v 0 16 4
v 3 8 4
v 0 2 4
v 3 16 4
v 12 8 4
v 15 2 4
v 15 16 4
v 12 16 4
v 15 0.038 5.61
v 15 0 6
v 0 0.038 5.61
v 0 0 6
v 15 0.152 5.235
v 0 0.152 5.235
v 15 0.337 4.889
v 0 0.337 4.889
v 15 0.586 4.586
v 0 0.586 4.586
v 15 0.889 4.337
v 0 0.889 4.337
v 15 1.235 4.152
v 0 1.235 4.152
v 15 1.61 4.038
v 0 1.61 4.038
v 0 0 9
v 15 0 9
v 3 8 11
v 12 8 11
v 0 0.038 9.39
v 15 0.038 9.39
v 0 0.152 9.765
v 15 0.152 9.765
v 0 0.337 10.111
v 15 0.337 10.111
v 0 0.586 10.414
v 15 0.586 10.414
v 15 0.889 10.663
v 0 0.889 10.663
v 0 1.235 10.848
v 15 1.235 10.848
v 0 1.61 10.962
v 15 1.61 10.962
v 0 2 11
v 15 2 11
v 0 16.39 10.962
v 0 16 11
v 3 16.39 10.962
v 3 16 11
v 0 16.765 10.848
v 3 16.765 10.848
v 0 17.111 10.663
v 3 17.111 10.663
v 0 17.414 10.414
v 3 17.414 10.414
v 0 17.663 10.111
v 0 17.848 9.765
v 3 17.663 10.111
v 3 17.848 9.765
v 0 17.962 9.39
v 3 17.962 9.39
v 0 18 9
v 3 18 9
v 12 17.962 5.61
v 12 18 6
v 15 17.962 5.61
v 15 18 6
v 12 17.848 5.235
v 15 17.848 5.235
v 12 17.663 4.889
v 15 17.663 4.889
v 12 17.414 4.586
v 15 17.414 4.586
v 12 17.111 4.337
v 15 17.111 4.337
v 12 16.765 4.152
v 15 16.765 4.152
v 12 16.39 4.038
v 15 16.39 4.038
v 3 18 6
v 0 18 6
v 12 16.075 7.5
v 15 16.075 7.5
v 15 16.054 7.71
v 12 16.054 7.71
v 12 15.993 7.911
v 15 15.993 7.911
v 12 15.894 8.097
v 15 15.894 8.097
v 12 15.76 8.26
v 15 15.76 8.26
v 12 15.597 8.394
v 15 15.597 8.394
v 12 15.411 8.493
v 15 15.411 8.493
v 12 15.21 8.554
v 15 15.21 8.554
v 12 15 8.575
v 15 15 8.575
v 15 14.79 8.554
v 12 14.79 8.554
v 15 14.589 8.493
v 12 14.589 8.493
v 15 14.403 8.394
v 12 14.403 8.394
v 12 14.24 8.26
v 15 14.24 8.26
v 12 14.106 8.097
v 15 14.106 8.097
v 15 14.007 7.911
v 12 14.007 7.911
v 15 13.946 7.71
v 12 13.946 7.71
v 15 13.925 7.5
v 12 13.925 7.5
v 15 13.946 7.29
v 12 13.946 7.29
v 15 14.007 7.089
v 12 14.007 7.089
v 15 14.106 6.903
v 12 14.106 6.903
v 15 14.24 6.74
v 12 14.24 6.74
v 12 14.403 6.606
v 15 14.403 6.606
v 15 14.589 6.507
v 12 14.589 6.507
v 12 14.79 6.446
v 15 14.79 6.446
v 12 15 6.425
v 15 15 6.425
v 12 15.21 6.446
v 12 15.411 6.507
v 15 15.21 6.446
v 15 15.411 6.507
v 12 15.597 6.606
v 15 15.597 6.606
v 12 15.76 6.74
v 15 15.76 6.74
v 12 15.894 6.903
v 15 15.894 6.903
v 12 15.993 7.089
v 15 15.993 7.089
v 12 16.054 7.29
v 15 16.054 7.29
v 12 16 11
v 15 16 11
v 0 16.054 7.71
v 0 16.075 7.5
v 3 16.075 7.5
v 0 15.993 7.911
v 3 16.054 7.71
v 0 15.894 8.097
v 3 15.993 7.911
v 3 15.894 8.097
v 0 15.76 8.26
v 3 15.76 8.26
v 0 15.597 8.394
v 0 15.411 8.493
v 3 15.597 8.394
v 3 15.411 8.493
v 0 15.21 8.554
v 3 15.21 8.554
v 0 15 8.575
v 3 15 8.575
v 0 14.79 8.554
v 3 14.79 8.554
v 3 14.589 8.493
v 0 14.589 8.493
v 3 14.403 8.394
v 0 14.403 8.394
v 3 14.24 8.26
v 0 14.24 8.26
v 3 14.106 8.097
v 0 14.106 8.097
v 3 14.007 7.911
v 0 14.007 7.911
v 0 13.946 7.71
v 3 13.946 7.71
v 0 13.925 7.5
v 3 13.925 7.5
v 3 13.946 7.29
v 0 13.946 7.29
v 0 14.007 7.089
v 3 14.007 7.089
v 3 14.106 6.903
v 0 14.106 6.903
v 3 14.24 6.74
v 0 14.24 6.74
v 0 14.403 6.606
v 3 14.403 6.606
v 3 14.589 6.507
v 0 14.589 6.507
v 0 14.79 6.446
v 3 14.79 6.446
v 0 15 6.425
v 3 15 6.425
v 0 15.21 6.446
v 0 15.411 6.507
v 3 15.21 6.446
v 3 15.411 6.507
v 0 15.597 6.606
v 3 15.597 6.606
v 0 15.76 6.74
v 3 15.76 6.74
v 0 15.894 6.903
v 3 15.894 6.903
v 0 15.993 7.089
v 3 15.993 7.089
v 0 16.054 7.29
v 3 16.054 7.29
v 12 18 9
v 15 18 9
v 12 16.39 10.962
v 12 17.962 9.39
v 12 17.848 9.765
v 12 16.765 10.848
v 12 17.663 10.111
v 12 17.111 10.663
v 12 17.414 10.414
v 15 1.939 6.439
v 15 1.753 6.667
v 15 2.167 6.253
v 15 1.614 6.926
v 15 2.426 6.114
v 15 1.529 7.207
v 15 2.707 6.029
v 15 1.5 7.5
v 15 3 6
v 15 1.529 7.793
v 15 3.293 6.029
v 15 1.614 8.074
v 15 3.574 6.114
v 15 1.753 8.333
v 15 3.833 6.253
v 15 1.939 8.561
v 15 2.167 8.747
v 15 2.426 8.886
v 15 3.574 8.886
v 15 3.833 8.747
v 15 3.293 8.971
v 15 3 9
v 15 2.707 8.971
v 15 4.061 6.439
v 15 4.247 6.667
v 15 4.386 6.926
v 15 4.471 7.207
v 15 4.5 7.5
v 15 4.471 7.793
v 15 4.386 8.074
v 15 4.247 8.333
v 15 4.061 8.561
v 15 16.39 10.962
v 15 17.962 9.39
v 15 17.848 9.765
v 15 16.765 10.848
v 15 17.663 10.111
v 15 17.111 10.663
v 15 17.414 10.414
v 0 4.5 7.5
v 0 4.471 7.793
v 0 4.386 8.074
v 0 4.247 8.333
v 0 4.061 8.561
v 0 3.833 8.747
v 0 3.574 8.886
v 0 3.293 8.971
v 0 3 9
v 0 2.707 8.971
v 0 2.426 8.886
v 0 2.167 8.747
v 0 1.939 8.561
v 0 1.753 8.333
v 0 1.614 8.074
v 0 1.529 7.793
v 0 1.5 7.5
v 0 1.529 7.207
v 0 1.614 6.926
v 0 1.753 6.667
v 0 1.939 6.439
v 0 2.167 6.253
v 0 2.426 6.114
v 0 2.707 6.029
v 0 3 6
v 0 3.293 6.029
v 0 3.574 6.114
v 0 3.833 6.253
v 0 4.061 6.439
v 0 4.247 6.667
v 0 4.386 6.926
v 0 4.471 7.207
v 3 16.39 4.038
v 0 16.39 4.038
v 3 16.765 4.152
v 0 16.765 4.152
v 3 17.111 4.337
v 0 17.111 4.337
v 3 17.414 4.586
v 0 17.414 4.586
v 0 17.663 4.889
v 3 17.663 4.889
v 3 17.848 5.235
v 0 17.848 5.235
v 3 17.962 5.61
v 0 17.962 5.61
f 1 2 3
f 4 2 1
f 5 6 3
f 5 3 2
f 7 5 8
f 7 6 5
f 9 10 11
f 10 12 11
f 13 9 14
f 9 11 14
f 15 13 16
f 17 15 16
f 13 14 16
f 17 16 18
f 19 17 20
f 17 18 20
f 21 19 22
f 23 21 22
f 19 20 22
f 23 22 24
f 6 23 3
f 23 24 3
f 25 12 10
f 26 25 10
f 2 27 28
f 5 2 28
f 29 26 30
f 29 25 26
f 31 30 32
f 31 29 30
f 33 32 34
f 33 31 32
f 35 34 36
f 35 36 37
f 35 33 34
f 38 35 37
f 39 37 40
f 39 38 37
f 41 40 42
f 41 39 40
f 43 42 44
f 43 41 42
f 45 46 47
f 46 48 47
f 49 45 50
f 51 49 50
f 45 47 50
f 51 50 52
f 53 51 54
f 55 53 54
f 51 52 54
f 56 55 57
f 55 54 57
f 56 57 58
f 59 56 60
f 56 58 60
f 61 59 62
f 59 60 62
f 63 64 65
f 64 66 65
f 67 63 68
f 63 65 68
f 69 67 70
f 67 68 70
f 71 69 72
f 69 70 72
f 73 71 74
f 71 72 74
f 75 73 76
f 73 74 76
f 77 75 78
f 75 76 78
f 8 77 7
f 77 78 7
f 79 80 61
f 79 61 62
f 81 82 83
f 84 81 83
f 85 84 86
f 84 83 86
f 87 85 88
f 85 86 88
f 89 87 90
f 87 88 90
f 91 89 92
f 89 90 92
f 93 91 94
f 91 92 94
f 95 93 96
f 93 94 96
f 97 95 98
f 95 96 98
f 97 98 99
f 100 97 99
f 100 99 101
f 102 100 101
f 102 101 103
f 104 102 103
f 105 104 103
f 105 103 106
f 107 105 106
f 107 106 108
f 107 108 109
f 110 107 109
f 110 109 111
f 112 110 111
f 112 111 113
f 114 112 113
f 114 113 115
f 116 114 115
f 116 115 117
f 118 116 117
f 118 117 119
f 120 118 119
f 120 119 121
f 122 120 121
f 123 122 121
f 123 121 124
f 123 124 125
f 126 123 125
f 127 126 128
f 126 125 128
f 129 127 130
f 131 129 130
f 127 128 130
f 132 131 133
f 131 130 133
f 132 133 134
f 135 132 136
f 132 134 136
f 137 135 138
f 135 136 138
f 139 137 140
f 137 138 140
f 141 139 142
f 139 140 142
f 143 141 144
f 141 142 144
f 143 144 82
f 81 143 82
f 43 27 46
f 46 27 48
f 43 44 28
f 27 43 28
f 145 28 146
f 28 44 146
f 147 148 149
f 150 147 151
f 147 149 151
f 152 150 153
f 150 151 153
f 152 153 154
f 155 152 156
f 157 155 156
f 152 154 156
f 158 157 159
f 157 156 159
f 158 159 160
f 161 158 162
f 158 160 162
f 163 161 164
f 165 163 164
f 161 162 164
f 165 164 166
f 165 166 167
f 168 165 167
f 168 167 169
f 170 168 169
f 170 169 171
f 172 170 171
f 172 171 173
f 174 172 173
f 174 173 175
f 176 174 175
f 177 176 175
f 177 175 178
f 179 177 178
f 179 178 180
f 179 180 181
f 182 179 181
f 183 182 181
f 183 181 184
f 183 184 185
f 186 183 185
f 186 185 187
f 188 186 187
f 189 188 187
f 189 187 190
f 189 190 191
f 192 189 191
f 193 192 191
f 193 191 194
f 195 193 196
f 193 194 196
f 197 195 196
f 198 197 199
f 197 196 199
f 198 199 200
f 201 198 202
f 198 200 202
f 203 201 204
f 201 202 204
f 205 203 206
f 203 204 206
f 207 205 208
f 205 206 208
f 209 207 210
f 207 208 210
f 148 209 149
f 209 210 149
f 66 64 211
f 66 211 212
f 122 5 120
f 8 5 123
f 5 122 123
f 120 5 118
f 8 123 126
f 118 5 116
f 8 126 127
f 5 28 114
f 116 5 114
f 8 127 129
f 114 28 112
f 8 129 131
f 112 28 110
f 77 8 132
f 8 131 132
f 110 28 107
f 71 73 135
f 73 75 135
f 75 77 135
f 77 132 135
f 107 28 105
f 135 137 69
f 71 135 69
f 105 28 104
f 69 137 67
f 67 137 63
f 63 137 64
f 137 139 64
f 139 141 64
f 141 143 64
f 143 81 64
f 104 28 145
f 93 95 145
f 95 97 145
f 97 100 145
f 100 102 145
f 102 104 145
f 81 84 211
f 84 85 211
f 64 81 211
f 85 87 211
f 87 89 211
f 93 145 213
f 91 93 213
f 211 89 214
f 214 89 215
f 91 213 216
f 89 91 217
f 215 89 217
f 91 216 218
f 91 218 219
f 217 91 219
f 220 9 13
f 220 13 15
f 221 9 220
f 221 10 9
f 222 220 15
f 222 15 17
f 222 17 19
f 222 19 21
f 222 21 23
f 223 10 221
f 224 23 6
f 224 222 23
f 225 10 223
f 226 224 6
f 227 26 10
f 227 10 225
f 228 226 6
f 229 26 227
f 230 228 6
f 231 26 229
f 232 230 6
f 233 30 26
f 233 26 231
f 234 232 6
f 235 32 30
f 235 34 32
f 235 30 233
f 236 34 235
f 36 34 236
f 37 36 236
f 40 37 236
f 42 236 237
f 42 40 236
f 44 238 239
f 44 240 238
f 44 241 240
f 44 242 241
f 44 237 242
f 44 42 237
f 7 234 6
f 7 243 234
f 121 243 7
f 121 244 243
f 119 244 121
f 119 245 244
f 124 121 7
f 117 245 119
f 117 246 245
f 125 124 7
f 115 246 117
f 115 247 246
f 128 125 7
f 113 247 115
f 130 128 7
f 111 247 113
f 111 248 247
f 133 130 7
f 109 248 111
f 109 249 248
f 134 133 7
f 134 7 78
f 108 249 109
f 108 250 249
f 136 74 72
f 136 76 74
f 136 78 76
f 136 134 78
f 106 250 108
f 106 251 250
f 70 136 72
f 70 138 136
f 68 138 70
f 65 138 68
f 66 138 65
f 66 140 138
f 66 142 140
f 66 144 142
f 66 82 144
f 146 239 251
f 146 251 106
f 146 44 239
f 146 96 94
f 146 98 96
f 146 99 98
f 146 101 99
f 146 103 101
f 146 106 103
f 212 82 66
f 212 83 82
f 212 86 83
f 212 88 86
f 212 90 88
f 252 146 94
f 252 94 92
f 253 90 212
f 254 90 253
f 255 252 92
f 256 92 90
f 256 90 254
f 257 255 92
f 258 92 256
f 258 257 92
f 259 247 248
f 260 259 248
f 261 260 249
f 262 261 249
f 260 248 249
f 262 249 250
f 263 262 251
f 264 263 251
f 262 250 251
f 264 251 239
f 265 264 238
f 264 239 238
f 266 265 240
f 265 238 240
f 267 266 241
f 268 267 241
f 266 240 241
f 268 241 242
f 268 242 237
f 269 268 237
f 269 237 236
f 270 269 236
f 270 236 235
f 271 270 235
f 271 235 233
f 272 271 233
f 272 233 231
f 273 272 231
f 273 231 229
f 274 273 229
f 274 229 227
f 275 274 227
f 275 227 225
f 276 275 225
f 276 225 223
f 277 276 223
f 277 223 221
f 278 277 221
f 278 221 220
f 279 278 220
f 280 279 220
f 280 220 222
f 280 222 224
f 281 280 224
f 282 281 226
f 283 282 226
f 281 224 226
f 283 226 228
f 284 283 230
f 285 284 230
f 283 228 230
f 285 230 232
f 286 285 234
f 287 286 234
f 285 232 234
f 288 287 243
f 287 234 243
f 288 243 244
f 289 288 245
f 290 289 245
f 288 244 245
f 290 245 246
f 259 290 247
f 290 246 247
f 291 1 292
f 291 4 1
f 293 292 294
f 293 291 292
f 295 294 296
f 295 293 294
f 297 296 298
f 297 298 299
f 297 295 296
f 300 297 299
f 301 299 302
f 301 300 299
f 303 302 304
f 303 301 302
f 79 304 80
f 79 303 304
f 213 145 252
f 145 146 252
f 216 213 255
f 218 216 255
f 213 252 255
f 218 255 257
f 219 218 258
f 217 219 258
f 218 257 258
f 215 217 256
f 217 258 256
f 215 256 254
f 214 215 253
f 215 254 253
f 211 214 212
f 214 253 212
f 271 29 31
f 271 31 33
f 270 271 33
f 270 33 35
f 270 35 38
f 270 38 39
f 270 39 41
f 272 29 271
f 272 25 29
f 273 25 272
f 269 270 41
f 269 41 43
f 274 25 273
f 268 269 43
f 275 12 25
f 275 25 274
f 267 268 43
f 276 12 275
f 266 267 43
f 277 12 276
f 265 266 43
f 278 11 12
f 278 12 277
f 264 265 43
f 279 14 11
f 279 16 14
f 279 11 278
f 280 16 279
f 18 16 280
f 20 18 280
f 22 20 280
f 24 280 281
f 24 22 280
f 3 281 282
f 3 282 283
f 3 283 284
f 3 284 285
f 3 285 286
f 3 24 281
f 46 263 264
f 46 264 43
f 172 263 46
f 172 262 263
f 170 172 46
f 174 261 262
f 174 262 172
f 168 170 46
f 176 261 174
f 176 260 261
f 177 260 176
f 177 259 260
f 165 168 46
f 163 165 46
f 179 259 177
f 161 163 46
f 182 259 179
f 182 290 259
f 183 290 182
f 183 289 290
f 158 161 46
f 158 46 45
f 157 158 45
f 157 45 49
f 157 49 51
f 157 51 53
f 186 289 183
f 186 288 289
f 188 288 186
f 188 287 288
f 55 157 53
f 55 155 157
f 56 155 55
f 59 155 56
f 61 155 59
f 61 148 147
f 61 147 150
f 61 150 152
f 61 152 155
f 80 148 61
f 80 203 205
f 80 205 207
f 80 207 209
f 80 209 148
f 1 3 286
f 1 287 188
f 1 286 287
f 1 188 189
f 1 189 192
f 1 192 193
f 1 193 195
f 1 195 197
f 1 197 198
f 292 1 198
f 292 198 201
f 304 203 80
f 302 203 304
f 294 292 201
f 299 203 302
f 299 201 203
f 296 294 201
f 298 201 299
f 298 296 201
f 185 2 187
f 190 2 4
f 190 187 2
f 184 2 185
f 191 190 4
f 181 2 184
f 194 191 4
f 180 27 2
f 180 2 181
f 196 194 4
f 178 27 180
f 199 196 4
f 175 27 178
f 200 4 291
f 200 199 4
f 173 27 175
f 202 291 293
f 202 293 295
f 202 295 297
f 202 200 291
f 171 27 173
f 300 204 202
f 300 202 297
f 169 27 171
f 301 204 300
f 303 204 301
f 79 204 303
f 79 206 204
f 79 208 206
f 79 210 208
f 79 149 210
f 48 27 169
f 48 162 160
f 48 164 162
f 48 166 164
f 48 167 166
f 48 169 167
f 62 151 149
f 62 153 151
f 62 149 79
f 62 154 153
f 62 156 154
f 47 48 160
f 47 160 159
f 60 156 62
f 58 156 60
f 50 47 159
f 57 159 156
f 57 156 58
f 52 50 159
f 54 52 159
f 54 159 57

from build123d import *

# Parameters (mm, degrees)
SKETCH_1_W          = 20
SKETCH_1_H          = 18
EXTRUDE_1_DEPTH     = 15
SKETCH_2_R          = 1.5
CUT_EXTRUDE_1_DEPTH = 31.805843601
SKETCH_3_W          = 10
SKETCH_3_H          = 10
CUT_EXTRUDE_2_DEPTH = 15
SKETCH_5_W          = 4
SKETCH_5_H          = 18
CUT_EXTRUDE_3_DEPTH = 31.805843601
SKETCH_6_R          = 1
CUT_EXTRUDE_4_DEPTH = 30.068883707
SKETCH_8_W          = 11.4
SKETCH_8_H          = 10
CUT_EXTRUDE_5_DEPTH = 10
SKETCH_9_W          = 11.4
SKETCH_9_H          = 10
EXTRUDE_2_DEPTH     = 7
SKETCH_10_R         = 1.075
CUT_EXTRUDE_6_DEPTH = 20
SKETCH_11_W         = 5
SKETCH_11_H         = 18
CUT_EXTRUDE_7_DEPTH = 20
SKETCH_12_W         = 9
SKETCH_12_H         = 10
CUT_EXTRUDE_8_DEPTH = 20
FILLET_1_R          = 2
FILLET_2_R          = 2
FILLET_3_R          = 2
FILLET_4_R          = 2
FILLET_5_R          = 2
FILLET_6_R          = 2


with BuildPart() as part:
    # 草图1 → 凸台-拉伸1 (new body)
    with BuildSketch(Plane.XY):
        with Locations((10, 9)):
            Rectangle(SKETCH_1_W, SKETCH_1_H)
    extrude(amount=EXTRUDE_1_DEPTH)

    # 草图2 → 切除-拉伸1 (cut, through all)
    with BuildSketch(Plane(origin=(20, 0, 0), x_dir=(0, 0, -1), z_dir=(1, 0, 0))):
        with Locations(Location((-7.5, 3, 0), (0, 0, 90))):
            Circle(SKETCH_2_R)
        with Locations((-7.5, 22)):
            Circle(SKETCH_2_R)
    extrude(amount=-CUT_EXTRUDE_1_DEPTH, mode=Mode.SUBTRACT)

    # 草图3 → 切除-拉伸2 (cut)
    with BuildSketch(Plane.XY.offset(15)):
        with Locations((10, 13)):
            Rectangle(SKETCH_3_W, SKETCH_3_H)
    extrude(amount=-CUT_EXTRUDE_2_DEPTH, mode=Mode.SUBTRACT)

    # 草图5 → 切除-拉伸3 (cut, through all)
    with BuildSketch(Plane(origin=(20, 0, 0), x_dir=(0, 0, -1), z_dir=(1, 0, 0))):
        with Locations((-13, 9)):
            Rectangle(SKETCH_5_W, SKETCH_5_H)
        with Locations((-2, 9)):
            Rectangle(SKETCH_5_W, SKETCH_5_H)
    extrude(amount=-CUT_EXTRUDE_3_DEPTH, mode=Mode.SUBTRACT)

    # 草图6 → 切除-拉伸4 (cut, through all)
    with BuildSketch(Plane(origin=(20, 0, 0), x_dir=(0, 0, -1), z_dir=(1, 0, 0))):
        with Locations(Location((-7.5, 15, 0), (0, 0, 90))):
            Circle(SKETCH_6_R)
    extrude(amount=-CUT_EXTRUDE_4_DEPTH, mode=Mode.SUBTRACT)

    # 草图8 → 切除-拉伸5 (cut)
    with BuildSketch(Plane.XY.offset(11)):
        with Locations((10, 13)):
            Rectangle(SKETCH_8_W, SKETCH_8_H)
    extrude(amount=-CUT_EXTRUDE_5_DEPTH, mode=Mode.SUBTRACT)

    # 草图9 → 凸台-拉伸2 (add)
    with BuildSketch(Plane.XY.offset(11)):
        with Locations((10, 13)):
            Rectangle(SKETCH_9_W, SKETCH_9_H)
    extrude(amount=-EXTRUDE_2_DEPTH)

    # 草图10 → 切除-拉伸6 (cut)
    with BuildSketch(Plane(origin=(20, 0, 0), x_dir=(0, 0, -1), z_dir=(1, 0, 0))):
        with Locations(Location((-7.5, 15, 0), (0, 0, 90))):
            Circle(SKETCH_10_R)
    extrude(amount=-CUT_EXTRUDE_6_DEPTH, mode=Mode.SUBTRACT)

    # 草图11 → 切除-拉伸7 (cut)
    with BuildSketch(Plane.XY.offset(11)):
        with Locations((17.5, 9)):
            Rectangle(SKETCH_11_W, SKETCH_11_H)
    extrude(amount=-CUT_EXTRUDE_7_DEPTH, mode=Mode.SUBTRACT)

    # 草图12 → 切除-拉伸8 (cut)
    with BuildSketch(Plane.XY.offset(11)):
        with Locations((7.5, 13)):
            Rectangle(SKETCH_12_W, SKETCH_12_H)
    extrude(amount=-CUT_EXTRUDE_8_DEPTH, mode=Mode.SUBTRACT)

    # 圆角1
    fillet_1_edges = [part.edges().sort_by_distance(p)[0] for p in [
        (7.5, 0, 11),
    ]]
    fillet(fillet_1_edges, radius=FILLET_1_R)

    # 圆角2
    fillet_2_edges = [part.edges().sort_by_distance(p)[0] for p in [
        (7.5, 0, 4),
    ]]
    fillet(fillet_2_edges, radius=FILLET_2_R)

    # 圆角3
    fillet_3_edges = [part.edges().sort_by_distance(p)[0] for p in [
        (1.5, 18, 11),
    ]]
    fillet(fillet_3_edges, radius=FILLET_3_R)

    # 圆角4
    fillet_4_edges = [part.edges().sort_by_distance(p)[0] for p in [
        (13.5, 18, 11),
    ]]
    fillet(fillet_4_edges, radius=FILLET_4_R)

    # 圆角5
    fillet_5_edges = [part.edges().sort_by_distance(p)[0] for p in [
        (13.5, 18, 4),
    ]]
    fillet(fillet_5_edges, radius=FILLET_5_R)

    # 圆角6
    fillet_6_edges = [part.edges().sort_by_distance(p)[0] for p in [
        (1.5, 18, 4),
    ]]
    fillet(fillet_6_edges, radius=FILLET_6_R)


solid = part.part
